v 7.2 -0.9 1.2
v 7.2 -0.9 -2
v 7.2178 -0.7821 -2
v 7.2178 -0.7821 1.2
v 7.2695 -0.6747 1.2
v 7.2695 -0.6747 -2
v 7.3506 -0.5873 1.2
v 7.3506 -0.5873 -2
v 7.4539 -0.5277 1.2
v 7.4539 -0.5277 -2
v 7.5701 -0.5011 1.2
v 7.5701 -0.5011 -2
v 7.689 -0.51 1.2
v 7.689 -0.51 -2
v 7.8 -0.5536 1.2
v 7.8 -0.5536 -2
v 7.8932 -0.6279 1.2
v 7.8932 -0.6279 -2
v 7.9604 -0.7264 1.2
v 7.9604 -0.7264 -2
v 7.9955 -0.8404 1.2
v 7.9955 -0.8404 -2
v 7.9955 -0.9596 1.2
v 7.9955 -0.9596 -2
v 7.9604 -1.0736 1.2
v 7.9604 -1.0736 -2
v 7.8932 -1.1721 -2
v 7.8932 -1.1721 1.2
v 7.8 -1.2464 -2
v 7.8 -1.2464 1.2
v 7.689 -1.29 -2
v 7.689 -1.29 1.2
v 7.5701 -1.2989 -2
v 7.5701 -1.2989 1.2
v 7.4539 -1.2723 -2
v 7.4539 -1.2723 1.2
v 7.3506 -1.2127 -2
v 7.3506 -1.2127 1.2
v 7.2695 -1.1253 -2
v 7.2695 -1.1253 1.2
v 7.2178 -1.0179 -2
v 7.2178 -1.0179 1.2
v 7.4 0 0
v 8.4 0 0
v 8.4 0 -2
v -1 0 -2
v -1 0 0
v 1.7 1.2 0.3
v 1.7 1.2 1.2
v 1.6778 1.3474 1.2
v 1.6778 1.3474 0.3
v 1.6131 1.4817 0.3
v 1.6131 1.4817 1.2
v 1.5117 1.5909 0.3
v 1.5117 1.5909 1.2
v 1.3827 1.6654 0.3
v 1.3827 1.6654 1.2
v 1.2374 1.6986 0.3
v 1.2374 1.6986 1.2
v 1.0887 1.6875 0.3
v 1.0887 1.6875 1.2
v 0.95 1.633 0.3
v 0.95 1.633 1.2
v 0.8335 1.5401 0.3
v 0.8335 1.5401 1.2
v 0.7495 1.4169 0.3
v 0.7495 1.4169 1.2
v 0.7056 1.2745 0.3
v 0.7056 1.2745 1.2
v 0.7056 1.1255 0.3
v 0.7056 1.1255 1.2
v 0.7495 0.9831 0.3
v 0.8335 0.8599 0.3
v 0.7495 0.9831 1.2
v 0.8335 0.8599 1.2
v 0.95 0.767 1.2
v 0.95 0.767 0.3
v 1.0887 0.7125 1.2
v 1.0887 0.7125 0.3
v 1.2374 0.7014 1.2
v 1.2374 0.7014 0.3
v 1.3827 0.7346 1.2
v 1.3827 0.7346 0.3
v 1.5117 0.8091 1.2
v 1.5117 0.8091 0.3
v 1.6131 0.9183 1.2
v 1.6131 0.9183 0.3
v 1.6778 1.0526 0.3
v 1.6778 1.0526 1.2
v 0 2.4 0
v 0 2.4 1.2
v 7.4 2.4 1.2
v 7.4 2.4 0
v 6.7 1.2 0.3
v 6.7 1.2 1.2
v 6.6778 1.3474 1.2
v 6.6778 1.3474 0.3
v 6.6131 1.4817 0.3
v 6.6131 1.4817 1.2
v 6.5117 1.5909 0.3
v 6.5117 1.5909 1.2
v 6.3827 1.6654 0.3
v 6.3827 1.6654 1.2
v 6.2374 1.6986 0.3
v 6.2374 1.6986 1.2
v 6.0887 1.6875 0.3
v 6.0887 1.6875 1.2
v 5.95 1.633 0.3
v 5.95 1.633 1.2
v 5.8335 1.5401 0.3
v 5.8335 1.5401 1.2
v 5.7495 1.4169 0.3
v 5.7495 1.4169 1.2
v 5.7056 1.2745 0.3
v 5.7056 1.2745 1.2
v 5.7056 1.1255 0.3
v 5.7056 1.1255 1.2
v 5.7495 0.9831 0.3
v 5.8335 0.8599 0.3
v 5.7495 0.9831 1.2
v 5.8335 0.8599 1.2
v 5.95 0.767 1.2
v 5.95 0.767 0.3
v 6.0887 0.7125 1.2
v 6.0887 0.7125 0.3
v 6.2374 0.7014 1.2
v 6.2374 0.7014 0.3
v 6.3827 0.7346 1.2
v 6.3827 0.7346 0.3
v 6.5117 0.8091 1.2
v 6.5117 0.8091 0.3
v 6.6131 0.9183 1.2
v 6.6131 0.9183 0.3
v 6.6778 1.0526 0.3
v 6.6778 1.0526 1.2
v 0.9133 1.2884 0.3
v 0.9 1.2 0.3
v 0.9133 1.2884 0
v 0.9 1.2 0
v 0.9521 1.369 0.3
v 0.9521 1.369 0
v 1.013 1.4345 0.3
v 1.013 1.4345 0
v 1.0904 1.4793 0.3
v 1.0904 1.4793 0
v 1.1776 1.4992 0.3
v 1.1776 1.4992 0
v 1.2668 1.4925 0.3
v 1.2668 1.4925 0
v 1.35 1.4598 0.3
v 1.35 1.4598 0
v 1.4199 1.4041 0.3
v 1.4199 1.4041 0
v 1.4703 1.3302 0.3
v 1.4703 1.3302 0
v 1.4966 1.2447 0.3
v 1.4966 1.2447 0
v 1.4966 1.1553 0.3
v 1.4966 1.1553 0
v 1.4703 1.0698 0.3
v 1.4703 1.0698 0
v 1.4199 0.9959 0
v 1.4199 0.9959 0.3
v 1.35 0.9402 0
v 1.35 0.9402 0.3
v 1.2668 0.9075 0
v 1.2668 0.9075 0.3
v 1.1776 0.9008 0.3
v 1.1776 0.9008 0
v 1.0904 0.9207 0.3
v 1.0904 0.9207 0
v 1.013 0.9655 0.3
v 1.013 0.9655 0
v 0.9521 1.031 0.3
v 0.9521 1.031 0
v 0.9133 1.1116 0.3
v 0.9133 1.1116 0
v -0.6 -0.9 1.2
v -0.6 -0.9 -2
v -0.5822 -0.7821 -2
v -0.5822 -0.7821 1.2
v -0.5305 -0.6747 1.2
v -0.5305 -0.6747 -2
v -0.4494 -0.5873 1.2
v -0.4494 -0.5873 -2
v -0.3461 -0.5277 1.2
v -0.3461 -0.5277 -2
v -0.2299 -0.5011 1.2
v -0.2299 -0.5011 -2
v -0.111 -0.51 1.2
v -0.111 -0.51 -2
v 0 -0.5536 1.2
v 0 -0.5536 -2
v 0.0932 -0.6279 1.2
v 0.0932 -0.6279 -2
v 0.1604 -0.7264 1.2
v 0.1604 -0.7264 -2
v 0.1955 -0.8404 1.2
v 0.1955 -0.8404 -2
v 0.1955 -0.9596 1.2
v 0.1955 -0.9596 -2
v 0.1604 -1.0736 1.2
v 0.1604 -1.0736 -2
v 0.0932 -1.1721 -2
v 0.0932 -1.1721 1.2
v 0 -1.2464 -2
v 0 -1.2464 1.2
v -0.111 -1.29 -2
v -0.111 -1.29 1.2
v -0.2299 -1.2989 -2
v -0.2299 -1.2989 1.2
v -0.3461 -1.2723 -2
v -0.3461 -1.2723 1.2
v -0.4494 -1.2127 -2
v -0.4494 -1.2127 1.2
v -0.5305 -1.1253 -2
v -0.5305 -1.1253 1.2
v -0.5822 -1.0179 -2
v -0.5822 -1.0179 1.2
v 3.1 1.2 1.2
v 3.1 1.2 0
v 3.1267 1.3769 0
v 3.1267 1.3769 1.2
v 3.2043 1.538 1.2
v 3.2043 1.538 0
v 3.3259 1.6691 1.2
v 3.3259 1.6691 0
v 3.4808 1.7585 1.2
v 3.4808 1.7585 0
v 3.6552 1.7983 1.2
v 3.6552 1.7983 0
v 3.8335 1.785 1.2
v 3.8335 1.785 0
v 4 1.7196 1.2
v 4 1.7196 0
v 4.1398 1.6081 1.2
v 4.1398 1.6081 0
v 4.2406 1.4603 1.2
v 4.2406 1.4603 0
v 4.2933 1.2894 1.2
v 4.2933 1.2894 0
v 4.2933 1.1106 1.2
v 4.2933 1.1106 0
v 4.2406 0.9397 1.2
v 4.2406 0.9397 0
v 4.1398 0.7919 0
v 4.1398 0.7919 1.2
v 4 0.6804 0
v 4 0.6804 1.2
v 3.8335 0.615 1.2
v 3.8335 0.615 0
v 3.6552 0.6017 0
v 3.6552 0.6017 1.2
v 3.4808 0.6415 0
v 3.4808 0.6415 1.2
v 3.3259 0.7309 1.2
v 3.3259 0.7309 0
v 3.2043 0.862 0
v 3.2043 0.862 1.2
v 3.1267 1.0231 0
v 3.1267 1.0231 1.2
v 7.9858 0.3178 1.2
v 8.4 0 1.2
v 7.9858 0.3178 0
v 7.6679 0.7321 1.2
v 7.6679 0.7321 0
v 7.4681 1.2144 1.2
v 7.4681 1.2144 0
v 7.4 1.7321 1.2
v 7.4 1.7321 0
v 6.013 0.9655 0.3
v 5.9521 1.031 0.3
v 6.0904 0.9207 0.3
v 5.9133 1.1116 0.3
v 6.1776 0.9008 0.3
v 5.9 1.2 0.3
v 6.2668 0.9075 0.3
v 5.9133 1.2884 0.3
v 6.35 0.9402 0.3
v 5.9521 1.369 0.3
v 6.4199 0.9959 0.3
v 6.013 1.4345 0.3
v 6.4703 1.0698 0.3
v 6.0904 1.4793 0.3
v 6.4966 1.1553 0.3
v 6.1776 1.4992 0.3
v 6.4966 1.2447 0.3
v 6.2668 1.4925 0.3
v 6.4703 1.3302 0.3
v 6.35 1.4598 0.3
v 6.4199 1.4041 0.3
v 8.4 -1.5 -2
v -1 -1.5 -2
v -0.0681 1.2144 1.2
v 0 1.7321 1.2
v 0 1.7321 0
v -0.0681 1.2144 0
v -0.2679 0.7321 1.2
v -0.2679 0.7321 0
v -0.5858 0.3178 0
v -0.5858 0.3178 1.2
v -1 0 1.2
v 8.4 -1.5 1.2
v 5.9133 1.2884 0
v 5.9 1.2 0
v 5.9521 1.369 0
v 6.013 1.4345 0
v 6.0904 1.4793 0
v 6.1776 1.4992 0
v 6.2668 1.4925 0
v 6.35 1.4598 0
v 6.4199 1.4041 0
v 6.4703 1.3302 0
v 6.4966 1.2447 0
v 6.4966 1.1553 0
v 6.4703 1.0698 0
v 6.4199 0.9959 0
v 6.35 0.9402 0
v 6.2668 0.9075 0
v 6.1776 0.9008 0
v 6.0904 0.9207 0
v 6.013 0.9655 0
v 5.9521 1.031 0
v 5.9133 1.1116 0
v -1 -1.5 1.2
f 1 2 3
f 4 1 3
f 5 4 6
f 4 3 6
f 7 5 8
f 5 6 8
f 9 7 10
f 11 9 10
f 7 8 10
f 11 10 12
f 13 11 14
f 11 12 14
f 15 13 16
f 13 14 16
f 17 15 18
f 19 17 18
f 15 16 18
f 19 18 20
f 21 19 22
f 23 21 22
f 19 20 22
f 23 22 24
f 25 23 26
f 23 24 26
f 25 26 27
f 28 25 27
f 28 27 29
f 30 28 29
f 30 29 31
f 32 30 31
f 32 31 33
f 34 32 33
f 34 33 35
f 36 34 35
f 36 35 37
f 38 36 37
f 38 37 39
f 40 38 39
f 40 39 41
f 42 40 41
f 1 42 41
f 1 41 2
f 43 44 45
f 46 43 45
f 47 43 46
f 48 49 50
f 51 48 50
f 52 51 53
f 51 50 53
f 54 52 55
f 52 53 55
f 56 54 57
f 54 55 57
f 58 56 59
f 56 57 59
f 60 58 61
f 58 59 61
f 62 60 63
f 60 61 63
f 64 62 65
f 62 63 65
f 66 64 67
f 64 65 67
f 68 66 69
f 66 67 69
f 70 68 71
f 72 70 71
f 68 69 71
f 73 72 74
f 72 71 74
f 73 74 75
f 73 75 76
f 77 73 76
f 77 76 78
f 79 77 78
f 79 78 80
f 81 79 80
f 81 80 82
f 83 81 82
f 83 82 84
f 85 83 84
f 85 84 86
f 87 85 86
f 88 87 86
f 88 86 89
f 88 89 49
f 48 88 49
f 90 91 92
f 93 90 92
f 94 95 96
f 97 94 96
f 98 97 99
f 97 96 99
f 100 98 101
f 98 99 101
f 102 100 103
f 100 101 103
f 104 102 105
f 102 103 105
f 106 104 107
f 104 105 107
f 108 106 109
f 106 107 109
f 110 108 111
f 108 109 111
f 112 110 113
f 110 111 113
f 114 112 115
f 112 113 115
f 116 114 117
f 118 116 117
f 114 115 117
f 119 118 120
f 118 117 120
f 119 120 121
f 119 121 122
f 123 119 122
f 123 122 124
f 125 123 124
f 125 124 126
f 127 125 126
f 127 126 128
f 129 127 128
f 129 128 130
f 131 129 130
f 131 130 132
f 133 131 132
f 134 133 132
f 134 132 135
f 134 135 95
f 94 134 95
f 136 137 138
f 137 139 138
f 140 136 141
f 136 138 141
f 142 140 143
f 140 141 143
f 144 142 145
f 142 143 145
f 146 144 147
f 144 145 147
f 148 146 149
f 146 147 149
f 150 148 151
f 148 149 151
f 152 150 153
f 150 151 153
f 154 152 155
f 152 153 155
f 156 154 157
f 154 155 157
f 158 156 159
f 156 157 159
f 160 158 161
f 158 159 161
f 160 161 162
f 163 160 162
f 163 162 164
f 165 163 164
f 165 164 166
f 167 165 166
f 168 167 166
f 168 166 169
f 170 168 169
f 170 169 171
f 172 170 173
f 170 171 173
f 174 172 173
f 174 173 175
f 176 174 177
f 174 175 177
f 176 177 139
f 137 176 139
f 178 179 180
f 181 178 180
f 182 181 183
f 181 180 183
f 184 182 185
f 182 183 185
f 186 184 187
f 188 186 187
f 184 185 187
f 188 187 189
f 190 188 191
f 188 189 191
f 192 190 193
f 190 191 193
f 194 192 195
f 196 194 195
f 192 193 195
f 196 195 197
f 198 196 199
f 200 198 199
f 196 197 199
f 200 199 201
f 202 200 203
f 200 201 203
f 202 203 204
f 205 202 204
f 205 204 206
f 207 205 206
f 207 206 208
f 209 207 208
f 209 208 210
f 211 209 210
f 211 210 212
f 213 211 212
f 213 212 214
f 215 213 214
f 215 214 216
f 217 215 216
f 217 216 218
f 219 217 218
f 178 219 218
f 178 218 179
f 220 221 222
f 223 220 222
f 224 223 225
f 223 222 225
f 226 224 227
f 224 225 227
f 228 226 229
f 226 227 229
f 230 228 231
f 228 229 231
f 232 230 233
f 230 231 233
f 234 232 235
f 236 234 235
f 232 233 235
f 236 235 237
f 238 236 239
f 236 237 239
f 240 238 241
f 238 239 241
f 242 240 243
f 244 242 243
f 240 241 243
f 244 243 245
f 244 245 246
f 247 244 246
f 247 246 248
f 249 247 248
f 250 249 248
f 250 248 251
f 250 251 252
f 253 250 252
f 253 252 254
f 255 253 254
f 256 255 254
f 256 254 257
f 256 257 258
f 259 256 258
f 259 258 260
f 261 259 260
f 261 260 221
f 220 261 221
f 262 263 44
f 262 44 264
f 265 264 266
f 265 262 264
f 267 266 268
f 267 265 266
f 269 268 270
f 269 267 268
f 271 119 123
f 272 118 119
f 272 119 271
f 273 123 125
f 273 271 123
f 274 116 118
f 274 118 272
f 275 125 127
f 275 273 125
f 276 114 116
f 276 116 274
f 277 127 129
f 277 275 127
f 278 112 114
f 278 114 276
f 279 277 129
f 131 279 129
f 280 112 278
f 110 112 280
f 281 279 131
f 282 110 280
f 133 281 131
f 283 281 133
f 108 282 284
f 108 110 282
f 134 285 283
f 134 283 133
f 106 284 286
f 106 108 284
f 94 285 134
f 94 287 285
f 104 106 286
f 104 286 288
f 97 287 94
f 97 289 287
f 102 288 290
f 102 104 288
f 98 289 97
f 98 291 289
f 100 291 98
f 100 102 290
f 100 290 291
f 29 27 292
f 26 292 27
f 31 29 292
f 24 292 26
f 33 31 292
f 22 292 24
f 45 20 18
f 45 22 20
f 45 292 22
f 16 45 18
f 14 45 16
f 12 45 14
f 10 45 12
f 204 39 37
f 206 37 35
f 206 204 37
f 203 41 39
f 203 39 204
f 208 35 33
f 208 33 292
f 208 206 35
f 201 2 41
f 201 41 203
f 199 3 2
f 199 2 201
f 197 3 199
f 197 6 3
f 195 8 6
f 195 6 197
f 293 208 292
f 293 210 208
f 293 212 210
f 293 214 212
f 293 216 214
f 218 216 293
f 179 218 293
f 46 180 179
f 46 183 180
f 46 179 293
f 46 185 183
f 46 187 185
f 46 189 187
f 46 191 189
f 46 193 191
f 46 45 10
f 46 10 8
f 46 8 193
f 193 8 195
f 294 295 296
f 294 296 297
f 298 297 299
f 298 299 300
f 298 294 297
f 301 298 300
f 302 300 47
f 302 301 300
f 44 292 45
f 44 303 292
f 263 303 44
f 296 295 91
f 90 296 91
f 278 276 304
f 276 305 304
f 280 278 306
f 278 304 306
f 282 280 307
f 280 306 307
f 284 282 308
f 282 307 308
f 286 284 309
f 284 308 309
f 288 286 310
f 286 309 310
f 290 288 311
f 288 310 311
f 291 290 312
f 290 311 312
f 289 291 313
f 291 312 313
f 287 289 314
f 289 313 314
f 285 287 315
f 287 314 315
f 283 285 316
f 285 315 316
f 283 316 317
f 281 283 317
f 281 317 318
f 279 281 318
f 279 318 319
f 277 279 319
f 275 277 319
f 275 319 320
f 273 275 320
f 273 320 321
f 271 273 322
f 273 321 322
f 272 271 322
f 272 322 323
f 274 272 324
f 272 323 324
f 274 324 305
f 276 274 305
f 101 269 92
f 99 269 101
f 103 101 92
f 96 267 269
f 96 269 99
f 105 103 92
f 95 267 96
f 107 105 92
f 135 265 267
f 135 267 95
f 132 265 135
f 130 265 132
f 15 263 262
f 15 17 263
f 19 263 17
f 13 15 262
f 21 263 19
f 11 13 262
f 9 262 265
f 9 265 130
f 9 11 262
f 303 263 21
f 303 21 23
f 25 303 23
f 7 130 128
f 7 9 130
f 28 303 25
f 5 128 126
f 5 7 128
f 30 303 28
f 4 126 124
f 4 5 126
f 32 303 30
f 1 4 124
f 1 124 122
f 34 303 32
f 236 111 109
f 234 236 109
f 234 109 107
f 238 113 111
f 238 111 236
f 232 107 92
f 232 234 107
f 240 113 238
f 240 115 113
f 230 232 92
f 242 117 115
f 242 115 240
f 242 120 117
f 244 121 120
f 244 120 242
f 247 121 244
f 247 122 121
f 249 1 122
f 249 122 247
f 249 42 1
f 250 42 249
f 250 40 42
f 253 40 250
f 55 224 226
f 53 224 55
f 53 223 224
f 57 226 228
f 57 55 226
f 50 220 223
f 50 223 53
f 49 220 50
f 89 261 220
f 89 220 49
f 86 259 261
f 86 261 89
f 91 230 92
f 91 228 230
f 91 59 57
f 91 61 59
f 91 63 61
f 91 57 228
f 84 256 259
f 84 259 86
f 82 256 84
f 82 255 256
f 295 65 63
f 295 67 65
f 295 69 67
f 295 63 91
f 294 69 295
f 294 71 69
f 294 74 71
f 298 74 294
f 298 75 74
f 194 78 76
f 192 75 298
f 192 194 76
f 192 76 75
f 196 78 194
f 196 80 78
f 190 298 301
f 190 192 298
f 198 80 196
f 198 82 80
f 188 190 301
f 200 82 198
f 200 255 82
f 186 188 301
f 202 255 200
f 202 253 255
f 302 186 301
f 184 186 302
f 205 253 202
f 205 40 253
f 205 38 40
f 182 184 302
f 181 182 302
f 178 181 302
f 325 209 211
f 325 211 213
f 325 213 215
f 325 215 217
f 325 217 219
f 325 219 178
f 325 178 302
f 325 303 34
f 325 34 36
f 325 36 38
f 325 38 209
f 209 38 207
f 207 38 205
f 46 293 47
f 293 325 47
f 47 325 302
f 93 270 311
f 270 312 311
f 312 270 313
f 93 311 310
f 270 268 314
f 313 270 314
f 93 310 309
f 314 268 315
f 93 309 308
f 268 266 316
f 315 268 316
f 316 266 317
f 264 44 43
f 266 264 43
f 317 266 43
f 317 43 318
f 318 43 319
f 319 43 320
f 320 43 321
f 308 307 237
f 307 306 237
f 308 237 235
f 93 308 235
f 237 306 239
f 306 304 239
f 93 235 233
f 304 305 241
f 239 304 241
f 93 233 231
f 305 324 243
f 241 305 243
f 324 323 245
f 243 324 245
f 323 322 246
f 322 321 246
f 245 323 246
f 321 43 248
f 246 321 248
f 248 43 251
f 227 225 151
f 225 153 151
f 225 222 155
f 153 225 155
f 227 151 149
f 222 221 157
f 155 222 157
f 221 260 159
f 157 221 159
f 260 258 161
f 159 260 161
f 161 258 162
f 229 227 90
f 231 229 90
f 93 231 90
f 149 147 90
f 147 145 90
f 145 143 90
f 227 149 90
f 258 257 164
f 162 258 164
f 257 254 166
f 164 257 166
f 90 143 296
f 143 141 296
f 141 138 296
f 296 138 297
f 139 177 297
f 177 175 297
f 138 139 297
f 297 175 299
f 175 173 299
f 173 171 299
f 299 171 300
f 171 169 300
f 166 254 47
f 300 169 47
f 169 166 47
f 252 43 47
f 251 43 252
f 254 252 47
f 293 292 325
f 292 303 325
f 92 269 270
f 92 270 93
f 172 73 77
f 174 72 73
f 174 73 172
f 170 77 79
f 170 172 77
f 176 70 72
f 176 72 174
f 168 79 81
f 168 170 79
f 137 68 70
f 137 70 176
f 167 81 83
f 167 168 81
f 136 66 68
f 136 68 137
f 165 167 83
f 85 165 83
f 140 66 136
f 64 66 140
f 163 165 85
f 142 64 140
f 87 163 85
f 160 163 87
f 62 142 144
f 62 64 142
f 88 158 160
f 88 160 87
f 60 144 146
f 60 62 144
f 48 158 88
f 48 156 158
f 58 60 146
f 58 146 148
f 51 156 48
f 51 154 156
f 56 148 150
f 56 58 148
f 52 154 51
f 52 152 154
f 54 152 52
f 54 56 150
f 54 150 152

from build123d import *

# Parameters (mm, degrees)
SKETCH1_W                  = 7.4
SKETCH1_H                  = 2.4
BOSS_EXTRUDE1_DEPTH        = 1.2
HOLE1_D                    = 0.6
HOLE1_DEPTH                = 1.2
HOLE1_CBORE_D              = 1
HOLE1_CBORE_DEPTH          = 0.9
HOLE1_TIP                  = 0.180258186
SKETCH11_W                 = 9.4
SKETCH11_H                 = 1.5
BOSS_EXTRUDE5_DEPTH        = 2
FILLET1_R                  = 2
F_0_8_0_8_DIAMETER_HOLE1_D = 0.8
M1_0_CLEARANCE_HOLE1_D     = 1.2


with BuildPart() as part:
    # Sketch1 → Boss-Extrude1 (new body)
    with BuildSketch(Plane.XY.offset(1.2)):
        with Locations((3.7, 1.2)):
            Rectangle(SKETCH1_W, SKETCH1_H)
        Polygon((8.4, 0), (7.4, 0), (0, 0), (-1, 0), (-1, -1.5), (8.4, -1.5), align=None)
    extrude(amount=-BOSS_EXTRUDE1_DEPTH)

    # Hole1
    with Locations(Plane.XY.offset(1.2)):
        with Locations((6.2, 1.2), (1.2, 1.2)):
            CounterBoreHole(HOLE1_D / 2, HOLE1_CBORE_D / 2, HOLE1_CBORE_DEPTH, depth=HOLE1_DEPTH)
            with Locations((0, 0, -(HOLE1_DEPTH + HOLE1_TIP / 2))):  # 118° drill point
                Cone(0, HOLE1_D / 2, HOLE1_TIP, mode=Mode.SUBTRACT)

    # Sketch11 → Boss-Extrude5 (add)
    with BuildSketch(Plane(origin=(0, 0, 0), x_dir=(-1, 0, 0), z_dir=(0, 0, -1))):
        with Locations((-3.7, -0.75)):
            Rectangle(SKETCH11_W, SKETCH11_H)
    extrude(amount=BOSS_EXTRUDE5_DEPTH)

    # Fillet1
    # the kernel refuses this fillet: 2 mm, written as the material it adds along each edge
    with BuildSketch(Plane(origin=(0, 0, 1.2), x_dir=(-1, 0, 0), z_dir=(0, 0, -1))) as fillet1_piece_1:
        with BuildLine():
            CenterArc((2, 1.732050808), FILLET1_R, 180, 60)
            Line((0, 1.732050808), (-0.04, 1.732050808))
            Line((-0.04, 1.732050808), (-0.04, 0))
            Line((-0.04, 0), (0, -0.04))
            ThreePointArc((0, -0.04), (0.5, -0.04), (0.98, -0.034641016))
            Line((0.98, -0.034641016), (1, 0))
        make_face()
    extrude(amount=1.2)
    with BuildSketch(Plane(origin=(7.4, 0, 1.2), x_dir=(1, 0, 0), z_dir=(0, 0, -1))) as fillet1_piece_2:
        with BuildLine():
            CenterArc((2, -1.732050808), FILLET1_R, 120, 60)
            Line((0, -1.732050808), (-0.04, -1.732050808))
            Line((-0.04, -1.732050808), (-0.04, 0))
            Line((-0.04, 0), (0, 0.04))
            ThreePointArc((0, 0.04), (0.5, 0.04), (0.98, 0.034641016))
            Line((0.98, 0.034641016), (1, 0))
        make_face()
    extrude(amount=1.2)

    # Ø0.8 (0.8) Diameter Hole1 (through all)
    with Locations(Plane.XY.offset(1.2)):
        with Locations((-0.2, -0.9), (7.6, -0.9)):
            Hole(F_0_8_0_8_DIAMETER_HOLE1_D / 2)

    # M1.0 Clearance Hole1 (through all)
    with Locations(Plane.XY.offset(1.2)):
        with Locations((3.7, 1.2)):
            Hole(M1_0_CLEARANCE_HOLE1_D / 2)


solid = part.part
